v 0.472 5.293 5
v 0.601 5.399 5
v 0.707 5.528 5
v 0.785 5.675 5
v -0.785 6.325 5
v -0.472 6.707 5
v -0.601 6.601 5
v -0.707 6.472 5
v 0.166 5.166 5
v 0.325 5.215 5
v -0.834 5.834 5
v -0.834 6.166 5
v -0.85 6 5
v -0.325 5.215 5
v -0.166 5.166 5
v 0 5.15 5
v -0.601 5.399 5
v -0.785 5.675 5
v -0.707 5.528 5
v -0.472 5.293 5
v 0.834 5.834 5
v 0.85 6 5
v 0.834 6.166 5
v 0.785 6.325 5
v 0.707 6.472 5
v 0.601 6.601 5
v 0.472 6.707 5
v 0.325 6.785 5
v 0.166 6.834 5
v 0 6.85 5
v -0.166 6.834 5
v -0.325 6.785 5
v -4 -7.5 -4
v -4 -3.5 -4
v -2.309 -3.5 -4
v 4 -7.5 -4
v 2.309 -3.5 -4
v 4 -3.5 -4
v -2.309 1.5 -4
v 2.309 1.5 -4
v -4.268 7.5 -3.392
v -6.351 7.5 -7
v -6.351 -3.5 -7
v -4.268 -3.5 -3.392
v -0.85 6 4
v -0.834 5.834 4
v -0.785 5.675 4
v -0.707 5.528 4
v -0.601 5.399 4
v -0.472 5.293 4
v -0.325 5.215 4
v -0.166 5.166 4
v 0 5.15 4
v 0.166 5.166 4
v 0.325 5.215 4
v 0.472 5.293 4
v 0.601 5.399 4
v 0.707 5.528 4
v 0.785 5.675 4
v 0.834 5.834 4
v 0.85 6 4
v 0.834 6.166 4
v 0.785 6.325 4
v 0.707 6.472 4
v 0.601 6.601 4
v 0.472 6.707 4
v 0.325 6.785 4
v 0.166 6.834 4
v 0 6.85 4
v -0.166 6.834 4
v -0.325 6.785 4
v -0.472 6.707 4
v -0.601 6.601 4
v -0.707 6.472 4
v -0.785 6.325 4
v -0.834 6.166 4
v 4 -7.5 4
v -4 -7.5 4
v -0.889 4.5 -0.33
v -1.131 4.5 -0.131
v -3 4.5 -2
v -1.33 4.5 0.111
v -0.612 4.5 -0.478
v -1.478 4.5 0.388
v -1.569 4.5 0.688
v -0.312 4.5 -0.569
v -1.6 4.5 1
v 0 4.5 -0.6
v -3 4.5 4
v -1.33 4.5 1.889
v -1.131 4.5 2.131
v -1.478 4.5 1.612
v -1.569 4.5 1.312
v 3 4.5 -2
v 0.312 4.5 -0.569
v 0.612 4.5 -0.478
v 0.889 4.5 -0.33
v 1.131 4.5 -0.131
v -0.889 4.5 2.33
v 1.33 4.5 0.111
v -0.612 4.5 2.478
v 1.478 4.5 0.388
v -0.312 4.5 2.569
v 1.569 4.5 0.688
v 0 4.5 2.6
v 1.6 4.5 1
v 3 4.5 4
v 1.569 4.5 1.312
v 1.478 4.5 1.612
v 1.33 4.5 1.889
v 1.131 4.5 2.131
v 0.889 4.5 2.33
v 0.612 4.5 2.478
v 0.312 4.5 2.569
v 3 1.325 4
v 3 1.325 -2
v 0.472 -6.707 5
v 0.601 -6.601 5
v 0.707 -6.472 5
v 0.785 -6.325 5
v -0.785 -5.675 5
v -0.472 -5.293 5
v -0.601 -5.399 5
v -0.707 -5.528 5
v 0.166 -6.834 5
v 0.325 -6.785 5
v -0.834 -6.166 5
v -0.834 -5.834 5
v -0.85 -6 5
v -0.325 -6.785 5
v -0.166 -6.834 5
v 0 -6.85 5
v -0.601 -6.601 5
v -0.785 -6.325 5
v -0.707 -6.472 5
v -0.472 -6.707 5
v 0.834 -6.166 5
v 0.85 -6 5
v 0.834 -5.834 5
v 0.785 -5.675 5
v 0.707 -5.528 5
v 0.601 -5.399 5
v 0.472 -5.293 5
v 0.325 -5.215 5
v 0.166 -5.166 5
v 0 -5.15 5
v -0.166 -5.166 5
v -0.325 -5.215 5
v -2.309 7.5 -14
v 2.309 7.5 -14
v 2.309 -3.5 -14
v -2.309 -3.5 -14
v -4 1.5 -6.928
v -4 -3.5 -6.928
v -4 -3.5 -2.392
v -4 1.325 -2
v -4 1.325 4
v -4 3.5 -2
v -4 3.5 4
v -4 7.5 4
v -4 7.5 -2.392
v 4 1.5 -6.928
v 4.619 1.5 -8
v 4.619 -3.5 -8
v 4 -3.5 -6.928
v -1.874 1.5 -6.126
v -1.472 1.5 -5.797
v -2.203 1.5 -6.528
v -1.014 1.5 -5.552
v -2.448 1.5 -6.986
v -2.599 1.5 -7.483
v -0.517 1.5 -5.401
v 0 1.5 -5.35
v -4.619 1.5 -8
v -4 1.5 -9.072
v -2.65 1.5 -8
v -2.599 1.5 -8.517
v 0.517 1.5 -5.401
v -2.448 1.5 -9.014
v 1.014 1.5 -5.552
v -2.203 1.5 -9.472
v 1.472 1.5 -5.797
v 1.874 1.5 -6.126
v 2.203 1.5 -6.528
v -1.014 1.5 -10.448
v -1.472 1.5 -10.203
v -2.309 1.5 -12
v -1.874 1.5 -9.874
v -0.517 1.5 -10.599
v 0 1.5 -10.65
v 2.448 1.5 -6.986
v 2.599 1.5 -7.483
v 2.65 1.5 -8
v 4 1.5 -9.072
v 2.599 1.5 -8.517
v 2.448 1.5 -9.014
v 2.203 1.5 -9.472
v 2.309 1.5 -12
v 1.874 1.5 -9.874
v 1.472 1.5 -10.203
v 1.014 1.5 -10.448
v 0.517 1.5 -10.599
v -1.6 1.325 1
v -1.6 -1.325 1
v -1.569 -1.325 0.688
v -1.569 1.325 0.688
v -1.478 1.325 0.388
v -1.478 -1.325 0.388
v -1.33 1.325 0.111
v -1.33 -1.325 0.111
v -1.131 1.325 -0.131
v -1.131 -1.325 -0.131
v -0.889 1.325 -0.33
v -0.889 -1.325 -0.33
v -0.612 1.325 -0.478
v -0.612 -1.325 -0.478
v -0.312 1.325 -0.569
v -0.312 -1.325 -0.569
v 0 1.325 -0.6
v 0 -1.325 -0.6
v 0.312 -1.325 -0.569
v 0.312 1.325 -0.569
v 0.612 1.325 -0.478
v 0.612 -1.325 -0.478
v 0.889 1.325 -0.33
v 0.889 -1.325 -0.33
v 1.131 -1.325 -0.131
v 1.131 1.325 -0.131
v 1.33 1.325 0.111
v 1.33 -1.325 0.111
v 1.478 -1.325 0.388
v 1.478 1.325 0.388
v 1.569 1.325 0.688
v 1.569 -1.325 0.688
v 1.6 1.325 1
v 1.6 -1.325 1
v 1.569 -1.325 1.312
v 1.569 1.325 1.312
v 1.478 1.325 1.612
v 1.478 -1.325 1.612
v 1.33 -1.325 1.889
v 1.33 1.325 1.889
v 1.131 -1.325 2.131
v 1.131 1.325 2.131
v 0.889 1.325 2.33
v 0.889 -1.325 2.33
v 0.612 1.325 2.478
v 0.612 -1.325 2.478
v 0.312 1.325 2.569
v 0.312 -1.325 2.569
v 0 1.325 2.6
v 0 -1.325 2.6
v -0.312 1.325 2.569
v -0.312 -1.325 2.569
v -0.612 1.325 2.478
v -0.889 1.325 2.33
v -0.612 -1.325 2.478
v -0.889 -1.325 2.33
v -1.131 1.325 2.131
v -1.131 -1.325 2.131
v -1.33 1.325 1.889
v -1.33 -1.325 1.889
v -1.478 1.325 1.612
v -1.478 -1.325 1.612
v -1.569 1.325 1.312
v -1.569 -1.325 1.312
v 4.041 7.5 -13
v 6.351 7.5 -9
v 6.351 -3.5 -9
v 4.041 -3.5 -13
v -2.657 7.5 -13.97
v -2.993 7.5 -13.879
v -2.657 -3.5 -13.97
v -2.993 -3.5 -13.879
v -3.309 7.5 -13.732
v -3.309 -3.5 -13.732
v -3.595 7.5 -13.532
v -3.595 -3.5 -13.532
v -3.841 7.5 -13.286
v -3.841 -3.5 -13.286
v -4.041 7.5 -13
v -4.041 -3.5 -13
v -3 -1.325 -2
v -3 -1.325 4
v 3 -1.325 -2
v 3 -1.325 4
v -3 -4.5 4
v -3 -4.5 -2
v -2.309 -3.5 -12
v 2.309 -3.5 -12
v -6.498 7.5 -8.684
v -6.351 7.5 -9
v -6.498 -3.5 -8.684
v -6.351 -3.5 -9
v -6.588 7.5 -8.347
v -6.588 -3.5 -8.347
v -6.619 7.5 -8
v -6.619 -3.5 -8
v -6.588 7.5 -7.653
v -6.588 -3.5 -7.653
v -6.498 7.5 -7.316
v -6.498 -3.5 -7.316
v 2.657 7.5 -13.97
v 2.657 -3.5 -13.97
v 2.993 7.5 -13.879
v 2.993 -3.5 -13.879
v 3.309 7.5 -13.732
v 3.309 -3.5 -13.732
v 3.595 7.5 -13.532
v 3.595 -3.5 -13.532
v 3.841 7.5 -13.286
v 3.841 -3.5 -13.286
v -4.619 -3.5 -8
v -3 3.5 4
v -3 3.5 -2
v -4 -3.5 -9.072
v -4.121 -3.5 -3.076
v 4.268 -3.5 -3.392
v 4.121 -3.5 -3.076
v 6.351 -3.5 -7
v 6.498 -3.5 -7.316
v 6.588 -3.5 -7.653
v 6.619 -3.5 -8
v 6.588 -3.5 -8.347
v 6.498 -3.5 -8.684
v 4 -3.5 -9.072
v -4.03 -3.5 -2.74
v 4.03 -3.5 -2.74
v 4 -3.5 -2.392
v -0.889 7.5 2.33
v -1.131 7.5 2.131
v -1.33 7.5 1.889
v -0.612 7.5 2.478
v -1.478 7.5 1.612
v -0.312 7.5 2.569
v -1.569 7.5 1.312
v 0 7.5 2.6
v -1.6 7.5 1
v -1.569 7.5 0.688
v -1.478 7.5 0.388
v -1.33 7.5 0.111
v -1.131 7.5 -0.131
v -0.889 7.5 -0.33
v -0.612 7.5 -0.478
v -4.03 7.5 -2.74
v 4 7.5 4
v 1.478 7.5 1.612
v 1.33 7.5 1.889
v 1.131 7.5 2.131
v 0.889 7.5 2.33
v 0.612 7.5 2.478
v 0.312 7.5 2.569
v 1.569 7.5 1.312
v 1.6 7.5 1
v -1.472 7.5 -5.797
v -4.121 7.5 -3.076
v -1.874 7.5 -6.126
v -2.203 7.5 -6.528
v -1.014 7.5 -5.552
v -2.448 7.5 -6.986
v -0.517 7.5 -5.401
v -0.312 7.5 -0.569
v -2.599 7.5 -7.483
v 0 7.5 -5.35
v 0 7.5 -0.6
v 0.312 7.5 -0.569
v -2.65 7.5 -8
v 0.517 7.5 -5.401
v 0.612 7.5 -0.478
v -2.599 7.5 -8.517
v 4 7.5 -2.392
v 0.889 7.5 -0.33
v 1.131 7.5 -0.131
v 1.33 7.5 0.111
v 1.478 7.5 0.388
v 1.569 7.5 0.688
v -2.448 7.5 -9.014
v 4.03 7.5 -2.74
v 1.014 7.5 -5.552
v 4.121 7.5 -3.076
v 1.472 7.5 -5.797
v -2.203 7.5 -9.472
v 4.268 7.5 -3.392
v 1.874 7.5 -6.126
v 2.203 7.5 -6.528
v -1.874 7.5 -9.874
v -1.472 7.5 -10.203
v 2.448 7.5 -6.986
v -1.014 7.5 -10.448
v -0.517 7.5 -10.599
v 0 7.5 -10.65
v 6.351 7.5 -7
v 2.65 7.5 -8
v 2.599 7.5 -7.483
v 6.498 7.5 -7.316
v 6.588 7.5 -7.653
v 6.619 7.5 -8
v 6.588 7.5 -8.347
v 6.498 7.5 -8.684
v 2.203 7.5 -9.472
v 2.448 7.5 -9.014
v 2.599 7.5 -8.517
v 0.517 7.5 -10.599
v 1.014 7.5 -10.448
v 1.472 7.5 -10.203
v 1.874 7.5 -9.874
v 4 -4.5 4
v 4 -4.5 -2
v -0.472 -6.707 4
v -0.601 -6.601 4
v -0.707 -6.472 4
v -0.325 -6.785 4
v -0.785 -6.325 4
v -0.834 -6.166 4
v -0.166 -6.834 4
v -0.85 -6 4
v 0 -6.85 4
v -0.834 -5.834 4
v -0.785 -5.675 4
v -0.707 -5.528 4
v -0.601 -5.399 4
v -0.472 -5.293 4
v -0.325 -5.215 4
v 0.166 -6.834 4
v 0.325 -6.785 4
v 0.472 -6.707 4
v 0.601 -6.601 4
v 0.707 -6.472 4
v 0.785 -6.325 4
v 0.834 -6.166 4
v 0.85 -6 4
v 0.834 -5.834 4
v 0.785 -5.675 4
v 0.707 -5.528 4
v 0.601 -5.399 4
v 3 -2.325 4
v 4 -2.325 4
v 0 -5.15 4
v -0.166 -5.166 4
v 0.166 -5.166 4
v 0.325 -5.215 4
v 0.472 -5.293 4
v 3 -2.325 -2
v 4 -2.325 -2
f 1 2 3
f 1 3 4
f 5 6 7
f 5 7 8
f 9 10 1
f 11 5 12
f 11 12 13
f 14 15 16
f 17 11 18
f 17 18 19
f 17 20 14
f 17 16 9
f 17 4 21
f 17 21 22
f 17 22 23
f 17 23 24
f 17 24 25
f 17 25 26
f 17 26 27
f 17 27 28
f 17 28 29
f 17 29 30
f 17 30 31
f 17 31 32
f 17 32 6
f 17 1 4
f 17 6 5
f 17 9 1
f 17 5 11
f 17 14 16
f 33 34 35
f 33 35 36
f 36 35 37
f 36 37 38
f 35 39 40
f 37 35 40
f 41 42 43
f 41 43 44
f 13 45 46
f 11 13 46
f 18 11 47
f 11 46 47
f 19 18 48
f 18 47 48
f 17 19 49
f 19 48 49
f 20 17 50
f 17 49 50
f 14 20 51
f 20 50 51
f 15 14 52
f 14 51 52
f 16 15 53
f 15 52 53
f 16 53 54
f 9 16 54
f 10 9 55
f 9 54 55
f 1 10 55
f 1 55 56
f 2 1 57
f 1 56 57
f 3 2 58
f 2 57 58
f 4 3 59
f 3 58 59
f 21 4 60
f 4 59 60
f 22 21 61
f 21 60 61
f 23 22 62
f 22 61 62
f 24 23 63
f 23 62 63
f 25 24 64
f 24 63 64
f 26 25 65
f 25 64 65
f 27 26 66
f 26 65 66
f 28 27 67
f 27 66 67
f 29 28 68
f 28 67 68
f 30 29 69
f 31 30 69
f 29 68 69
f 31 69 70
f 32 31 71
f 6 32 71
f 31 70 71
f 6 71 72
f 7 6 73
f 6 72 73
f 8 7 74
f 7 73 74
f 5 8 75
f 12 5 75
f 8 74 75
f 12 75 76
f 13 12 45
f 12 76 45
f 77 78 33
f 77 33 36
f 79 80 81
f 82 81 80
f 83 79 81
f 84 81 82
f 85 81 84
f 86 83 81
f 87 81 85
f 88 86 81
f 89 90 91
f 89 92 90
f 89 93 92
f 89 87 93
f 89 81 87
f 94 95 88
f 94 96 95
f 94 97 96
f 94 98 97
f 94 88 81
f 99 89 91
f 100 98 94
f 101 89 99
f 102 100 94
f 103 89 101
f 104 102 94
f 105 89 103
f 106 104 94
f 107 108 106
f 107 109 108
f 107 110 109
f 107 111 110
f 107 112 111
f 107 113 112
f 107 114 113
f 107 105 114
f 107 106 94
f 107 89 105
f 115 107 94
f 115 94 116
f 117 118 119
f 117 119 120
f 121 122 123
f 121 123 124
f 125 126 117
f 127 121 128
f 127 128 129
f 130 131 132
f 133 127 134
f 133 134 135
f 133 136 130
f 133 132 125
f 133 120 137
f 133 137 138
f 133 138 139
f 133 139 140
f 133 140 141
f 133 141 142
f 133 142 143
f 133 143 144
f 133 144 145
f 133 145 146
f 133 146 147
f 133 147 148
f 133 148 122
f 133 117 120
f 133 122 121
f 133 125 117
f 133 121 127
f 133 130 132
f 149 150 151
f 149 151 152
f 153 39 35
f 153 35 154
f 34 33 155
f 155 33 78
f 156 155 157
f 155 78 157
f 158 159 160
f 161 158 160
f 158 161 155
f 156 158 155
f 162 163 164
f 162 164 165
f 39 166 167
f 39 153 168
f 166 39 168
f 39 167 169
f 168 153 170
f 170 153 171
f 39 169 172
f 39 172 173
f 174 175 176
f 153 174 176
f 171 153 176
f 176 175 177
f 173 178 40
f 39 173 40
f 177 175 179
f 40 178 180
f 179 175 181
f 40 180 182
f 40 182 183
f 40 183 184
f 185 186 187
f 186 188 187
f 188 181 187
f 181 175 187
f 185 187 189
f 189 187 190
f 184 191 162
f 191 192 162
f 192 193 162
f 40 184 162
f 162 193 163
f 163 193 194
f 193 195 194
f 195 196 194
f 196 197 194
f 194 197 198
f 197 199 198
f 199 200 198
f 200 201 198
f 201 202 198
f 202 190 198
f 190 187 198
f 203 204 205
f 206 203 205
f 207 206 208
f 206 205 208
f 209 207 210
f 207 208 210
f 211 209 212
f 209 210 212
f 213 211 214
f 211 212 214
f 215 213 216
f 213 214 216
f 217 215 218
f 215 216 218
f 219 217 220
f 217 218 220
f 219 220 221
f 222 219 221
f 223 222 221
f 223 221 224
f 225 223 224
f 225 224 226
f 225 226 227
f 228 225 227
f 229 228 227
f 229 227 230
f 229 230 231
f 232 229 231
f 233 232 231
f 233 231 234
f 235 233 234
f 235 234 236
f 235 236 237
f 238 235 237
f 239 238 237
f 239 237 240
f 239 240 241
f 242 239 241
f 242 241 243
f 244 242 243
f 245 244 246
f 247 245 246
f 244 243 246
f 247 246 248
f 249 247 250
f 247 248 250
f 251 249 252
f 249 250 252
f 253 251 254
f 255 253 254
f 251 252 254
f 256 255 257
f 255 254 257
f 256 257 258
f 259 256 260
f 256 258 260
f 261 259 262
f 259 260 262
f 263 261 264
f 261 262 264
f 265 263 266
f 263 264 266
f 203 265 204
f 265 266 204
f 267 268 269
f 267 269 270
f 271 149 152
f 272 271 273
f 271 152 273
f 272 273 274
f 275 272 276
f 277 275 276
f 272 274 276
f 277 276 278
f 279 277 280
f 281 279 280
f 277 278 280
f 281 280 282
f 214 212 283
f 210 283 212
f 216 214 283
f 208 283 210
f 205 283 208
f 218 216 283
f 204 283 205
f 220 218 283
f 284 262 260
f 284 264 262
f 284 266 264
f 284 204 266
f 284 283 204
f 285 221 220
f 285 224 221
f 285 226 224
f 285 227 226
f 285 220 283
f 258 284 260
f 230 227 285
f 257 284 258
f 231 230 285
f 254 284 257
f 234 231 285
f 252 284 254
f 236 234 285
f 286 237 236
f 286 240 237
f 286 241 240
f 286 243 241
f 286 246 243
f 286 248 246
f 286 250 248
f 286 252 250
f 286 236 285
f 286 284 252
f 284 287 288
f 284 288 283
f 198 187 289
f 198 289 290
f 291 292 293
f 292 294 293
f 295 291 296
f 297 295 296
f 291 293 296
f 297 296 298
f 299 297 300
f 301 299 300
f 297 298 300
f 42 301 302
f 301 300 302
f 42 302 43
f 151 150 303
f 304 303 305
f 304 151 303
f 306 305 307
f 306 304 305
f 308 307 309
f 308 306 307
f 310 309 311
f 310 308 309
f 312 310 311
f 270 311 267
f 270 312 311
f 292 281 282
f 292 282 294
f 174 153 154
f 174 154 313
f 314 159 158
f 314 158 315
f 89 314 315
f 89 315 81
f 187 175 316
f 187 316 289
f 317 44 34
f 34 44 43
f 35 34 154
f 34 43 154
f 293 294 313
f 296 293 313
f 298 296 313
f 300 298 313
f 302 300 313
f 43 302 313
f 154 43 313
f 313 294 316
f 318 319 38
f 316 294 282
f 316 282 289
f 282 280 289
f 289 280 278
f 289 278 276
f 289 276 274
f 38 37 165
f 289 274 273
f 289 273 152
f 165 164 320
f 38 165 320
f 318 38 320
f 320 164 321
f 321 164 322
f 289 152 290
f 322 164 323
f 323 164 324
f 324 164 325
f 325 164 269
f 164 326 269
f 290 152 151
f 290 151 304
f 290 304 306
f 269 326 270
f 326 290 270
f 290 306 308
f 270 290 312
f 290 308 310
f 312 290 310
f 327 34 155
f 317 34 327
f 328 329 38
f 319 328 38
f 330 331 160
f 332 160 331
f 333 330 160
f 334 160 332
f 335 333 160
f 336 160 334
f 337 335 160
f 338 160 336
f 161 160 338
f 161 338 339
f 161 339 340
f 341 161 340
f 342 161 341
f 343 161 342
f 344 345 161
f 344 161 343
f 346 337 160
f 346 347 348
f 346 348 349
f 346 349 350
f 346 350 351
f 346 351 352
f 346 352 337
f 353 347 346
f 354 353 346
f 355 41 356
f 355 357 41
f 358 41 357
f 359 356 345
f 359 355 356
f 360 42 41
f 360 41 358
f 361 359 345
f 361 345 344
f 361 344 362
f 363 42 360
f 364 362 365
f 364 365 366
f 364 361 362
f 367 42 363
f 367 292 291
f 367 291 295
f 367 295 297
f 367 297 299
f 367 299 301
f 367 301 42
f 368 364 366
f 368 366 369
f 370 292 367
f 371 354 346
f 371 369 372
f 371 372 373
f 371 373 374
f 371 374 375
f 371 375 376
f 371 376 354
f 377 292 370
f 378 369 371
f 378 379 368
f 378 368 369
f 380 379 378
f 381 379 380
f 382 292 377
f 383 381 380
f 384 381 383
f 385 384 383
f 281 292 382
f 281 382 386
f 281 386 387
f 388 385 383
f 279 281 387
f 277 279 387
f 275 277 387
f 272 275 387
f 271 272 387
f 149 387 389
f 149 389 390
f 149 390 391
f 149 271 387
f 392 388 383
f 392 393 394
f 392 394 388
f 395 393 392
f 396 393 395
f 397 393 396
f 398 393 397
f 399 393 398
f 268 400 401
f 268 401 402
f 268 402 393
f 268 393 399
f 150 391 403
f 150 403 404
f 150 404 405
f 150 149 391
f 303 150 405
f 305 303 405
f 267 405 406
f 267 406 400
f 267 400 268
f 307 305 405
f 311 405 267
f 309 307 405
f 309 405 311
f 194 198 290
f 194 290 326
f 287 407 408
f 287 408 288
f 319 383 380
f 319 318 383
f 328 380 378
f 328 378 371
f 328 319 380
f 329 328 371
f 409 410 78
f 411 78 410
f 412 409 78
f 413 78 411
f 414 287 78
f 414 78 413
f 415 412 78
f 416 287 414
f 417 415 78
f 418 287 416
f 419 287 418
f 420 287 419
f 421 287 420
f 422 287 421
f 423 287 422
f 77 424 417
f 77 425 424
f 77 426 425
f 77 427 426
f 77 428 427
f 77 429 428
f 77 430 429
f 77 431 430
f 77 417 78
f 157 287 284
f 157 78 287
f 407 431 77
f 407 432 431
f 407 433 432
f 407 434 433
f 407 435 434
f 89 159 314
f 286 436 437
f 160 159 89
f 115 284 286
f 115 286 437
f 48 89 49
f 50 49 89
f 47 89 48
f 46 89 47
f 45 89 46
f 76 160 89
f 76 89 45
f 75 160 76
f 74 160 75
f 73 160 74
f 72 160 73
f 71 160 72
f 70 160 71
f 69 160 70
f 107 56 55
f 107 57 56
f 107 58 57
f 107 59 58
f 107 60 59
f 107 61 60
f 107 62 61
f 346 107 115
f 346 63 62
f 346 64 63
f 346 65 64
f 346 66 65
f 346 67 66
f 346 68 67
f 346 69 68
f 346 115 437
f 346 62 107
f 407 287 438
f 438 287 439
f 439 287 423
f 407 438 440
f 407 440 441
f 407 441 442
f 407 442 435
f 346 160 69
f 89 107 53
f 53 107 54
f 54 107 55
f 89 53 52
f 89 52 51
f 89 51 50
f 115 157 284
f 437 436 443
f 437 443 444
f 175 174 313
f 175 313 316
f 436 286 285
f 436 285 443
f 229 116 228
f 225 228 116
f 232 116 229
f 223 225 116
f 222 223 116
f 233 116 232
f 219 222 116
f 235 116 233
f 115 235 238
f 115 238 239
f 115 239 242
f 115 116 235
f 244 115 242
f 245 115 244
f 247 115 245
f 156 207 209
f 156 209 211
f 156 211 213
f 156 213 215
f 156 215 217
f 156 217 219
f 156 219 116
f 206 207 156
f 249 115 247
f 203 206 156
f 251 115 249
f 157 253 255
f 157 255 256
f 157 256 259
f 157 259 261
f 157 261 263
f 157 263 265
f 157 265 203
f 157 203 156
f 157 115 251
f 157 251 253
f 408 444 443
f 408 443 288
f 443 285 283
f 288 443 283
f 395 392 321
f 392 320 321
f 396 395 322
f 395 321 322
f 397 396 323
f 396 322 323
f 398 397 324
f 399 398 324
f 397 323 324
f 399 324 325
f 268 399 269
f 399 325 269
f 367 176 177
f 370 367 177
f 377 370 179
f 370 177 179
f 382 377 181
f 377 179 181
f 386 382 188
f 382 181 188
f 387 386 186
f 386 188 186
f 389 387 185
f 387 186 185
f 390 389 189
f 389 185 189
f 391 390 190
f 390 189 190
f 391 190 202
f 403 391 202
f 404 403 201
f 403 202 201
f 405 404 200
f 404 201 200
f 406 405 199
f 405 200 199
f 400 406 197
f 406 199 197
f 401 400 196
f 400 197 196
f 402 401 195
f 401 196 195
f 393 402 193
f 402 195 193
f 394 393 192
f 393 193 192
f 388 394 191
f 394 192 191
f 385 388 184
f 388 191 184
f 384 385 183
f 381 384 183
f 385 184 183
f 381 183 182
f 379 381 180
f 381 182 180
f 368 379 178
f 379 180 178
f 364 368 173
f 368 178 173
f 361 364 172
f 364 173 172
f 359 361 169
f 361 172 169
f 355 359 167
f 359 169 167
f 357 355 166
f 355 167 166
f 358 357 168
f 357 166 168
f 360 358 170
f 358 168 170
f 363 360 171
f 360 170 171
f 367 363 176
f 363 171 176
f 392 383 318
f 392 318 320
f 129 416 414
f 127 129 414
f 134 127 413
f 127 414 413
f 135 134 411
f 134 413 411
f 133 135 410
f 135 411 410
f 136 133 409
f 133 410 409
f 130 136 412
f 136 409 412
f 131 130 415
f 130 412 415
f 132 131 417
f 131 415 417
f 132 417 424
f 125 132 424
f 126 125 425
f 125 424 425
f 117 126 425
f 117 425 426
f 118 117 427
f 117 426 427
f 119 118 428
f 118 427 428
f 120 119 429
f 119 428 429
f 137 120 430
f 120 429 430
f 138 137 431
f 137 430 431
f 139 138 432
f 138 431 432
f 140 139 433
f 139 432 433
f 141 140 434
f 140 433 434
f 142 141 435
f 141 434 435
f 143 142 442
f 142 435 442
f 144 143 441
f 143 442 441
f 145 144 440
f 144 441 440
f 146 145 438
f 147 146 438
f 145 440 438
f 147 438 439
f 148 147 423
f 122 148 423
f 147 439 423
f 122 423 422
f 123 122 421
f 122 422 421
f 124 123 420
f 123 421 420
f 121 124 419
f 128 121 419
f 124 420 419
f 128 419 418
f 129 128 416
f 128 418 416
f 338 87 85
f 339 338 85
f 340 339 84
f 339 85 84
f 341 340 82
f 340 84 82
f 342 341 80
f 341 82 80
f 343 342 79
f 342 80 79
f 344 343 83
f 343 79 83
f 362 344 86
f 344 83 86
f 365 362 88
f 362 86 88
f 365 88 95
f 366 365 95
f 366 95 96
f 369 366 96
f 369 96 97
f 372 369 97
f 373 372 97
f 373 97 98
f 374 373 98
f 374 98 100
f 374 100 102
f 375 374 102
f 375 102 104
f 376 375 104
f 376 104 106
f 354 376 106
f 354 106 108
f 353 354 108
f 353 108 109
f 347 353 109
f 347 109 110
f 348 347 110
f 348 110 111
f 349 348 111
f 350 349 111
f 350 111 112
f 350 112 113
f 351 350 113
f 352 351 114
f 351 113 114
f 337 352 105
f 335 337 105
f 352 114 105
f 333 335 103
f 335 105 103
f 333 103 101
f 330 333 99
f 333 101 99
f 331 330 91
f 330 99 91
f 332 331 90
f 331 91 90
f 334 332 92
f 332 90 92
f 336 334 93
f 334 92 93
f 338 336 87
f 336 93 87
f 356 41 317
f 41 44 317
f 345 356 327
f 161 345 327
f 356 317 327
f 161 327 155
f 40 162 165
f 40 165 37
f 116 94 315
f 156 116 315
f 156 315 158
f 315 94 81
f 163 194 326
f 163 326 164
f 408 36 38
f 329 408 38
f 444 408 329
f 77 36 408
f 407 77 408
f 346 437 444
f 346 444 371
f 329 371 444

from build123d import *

# Parameters (mm, degrees)
SKETCH1_W                = 8
SKETCH1_H                = 15
BOSS_EXTRUDE1_DEPTH      = 4
CUT_EXTRUDE1_DEPTH       = 6
M3_CLEARANCE_HOLE2_D     = 3.2
M3_CLEARANCE_HOLE2_DEPTH = 12
SKETCH9_R                = 0.85
BOSS_EXTRUDE2_DEPTH      = 1
SKETCH12_W               = 8
SKETCH12_H               = 6
BOSS_EXTRUDE3_DEPTH      = 8
M5_CLEARANCE_HOLE1_D     = 5.3
BOSS_EXTRUDE4_START      = -6
SKETCH18_R               = 2.65
BOSS_EXTRUDE4_DEPTH      = 6
BOSS_EXTRUDE5_DEPTH      = 11
FILLET2_R                = 2


with BuildPart() as part:
    # Sketch1 → Boss-Extrude1 (new, symmetric)
    with BuildSketch(Plane.XY):
        Rectangle(SKETCH1_W, SKETCH1_H)
    extrude(amount=BOSS_EXTRUDE1_DEPTH, both=True)

    # Sketch2 → Cut-Extrude1 (cut)
    with BuildSketch(Plane.XY.offset(4)):
        Polygon((-3, 4.5), (3, 4.5), (3, 1.325), (-4, 1.325), (-4, 3.5), (-3, 3.5), align=None)
        Polygon((4, -4.5), (-3, -4.5), (-3, -1.325), (3, -1.325), (3, -2.325), (4, -2.325), align=None)
    extrude(amount=-CUT_EXTRUDE1_DEPTH, mode=Mode.SUBTRACT)

    # M3 Clearance Hole2
    with Locations(Plane(origin=(0, 7.5, 0), x_dir=(1, 0, 0), z_dir=(0, 1, 0))):
        with Locations((0, -1)):
            Hole(M3_CLEARANCE_HOLE2_D / 2, depth=M3_CLEARANCE_HOLE2_DEPTH)

    # Sketch9 → Boss-Extrude2 (add)
    with BuildSketch(Plane.XY.offset(4)):
        with Locations(Location((0, 6, 0), (0, 0, 180))):
            Circle(SKETCH9_R)
        with Locations(Location((0, -6, 0), (0, 0, 180))):
            Circle(SKETCH9_R)
    extrude(amount=BOSS_EXTRUDE2_DEPTH)

    # Sketch12 → Boss-Extrude3 (add)
    with BuildSketch(Plane(origin=(0, 0, -4), x_dir=(-1, 0, 0), z_dir=(0, 0, -1))):
        with Locations((0, 4.5)):
            Rectangle(SKETCH12_W, SKETCH12_H)
    extrude(amount=BOSS_EXTRUDE3_DEPTH)

    # M5 Clearance Hole1 (through all)
    with Locations(Plane(origin=(0, 7.5, 0), x_dir=(1, 0, 0), z_dir=(0, 1, 0))):
        with Locations((0, 8)):
            Hole(M5_CLEARANCE_HOLE1_D / 2)

    # Sketch18 → Boss-Extrude4 (add)
    with BuildSketch(Plane(origin=(0, 7.5, 0), x_dir=(1, 0, 0), z_dir=(0, 1, 0)).offset(BOSS_EXTRUDE4_START)):
        Polygon((4.618802154, 8), (2.309401077, 12), (-2.309401077, 12), (-4.618802154, 8), (-2.309401077, 4), (2.309401077, 4), align=None)
        with Locations(Location((0, 8, 0), (0, 0, 270))):
            Circle(SKETCH18_R, mode=Mode.SUBTRACT)
    extrude(amount=BOSS_EXTRUDE4_DEPTH)

    # Sketch19 → Boss-Extrude5 (add)
    with BuildSketch(Plane(origin=(0, 7.5, 0), x_dir=(1, 0, 0), z_dir=(0, 1, 0))):
        Polygon((4, 2.92820323), (6.92820323, 8), (3.464101615, 14), (-3.464101615, 14), (-6.92820323, 8), (-4, 2.92820323), (-4, 6.92820323), (-4.618802154, 8), (-4, 9.07179677), (-4, 12), (-2.309401077, 12), (2.309401077, 12), (4, 12), (4, 9.07179677), (4.618802154, 8), (4, 6.92820323), align=None)
        Polygon((2.309401077, 12), (4, 9.07179677), (4, 12), align=None)
        Polygon((-4, 9.07179677), (-2.309401077, 12), (-4, 12), align=None)
        Polygon((3.464101615, 2), (4, 2.92820323), (4, 6.92820323), (2.309401077, 4), (-2.309401077, 4), (-4, 6.92820323), (-4, 2.92820323), (-3.464101615, 2), align=None)
    extrude(amount=-BOSS_EXTRUDE5_DEPTH)

    # Fillet2
    fillet2_edges = [part.edges().sort_by_distance(p)[0] for p in [
        (6.92820323, 2, -8),
        (-4, 2, -2.92820323),
        (-6.92820323, 2, -8),
        (-3.464101615, 2, -14),
        (3.464101615, 2, -14),
        (4, 2, -2.92820323),
    ]]
    fillet(fillet2_edges, radius=FILLET2_R)


solid = part.part
